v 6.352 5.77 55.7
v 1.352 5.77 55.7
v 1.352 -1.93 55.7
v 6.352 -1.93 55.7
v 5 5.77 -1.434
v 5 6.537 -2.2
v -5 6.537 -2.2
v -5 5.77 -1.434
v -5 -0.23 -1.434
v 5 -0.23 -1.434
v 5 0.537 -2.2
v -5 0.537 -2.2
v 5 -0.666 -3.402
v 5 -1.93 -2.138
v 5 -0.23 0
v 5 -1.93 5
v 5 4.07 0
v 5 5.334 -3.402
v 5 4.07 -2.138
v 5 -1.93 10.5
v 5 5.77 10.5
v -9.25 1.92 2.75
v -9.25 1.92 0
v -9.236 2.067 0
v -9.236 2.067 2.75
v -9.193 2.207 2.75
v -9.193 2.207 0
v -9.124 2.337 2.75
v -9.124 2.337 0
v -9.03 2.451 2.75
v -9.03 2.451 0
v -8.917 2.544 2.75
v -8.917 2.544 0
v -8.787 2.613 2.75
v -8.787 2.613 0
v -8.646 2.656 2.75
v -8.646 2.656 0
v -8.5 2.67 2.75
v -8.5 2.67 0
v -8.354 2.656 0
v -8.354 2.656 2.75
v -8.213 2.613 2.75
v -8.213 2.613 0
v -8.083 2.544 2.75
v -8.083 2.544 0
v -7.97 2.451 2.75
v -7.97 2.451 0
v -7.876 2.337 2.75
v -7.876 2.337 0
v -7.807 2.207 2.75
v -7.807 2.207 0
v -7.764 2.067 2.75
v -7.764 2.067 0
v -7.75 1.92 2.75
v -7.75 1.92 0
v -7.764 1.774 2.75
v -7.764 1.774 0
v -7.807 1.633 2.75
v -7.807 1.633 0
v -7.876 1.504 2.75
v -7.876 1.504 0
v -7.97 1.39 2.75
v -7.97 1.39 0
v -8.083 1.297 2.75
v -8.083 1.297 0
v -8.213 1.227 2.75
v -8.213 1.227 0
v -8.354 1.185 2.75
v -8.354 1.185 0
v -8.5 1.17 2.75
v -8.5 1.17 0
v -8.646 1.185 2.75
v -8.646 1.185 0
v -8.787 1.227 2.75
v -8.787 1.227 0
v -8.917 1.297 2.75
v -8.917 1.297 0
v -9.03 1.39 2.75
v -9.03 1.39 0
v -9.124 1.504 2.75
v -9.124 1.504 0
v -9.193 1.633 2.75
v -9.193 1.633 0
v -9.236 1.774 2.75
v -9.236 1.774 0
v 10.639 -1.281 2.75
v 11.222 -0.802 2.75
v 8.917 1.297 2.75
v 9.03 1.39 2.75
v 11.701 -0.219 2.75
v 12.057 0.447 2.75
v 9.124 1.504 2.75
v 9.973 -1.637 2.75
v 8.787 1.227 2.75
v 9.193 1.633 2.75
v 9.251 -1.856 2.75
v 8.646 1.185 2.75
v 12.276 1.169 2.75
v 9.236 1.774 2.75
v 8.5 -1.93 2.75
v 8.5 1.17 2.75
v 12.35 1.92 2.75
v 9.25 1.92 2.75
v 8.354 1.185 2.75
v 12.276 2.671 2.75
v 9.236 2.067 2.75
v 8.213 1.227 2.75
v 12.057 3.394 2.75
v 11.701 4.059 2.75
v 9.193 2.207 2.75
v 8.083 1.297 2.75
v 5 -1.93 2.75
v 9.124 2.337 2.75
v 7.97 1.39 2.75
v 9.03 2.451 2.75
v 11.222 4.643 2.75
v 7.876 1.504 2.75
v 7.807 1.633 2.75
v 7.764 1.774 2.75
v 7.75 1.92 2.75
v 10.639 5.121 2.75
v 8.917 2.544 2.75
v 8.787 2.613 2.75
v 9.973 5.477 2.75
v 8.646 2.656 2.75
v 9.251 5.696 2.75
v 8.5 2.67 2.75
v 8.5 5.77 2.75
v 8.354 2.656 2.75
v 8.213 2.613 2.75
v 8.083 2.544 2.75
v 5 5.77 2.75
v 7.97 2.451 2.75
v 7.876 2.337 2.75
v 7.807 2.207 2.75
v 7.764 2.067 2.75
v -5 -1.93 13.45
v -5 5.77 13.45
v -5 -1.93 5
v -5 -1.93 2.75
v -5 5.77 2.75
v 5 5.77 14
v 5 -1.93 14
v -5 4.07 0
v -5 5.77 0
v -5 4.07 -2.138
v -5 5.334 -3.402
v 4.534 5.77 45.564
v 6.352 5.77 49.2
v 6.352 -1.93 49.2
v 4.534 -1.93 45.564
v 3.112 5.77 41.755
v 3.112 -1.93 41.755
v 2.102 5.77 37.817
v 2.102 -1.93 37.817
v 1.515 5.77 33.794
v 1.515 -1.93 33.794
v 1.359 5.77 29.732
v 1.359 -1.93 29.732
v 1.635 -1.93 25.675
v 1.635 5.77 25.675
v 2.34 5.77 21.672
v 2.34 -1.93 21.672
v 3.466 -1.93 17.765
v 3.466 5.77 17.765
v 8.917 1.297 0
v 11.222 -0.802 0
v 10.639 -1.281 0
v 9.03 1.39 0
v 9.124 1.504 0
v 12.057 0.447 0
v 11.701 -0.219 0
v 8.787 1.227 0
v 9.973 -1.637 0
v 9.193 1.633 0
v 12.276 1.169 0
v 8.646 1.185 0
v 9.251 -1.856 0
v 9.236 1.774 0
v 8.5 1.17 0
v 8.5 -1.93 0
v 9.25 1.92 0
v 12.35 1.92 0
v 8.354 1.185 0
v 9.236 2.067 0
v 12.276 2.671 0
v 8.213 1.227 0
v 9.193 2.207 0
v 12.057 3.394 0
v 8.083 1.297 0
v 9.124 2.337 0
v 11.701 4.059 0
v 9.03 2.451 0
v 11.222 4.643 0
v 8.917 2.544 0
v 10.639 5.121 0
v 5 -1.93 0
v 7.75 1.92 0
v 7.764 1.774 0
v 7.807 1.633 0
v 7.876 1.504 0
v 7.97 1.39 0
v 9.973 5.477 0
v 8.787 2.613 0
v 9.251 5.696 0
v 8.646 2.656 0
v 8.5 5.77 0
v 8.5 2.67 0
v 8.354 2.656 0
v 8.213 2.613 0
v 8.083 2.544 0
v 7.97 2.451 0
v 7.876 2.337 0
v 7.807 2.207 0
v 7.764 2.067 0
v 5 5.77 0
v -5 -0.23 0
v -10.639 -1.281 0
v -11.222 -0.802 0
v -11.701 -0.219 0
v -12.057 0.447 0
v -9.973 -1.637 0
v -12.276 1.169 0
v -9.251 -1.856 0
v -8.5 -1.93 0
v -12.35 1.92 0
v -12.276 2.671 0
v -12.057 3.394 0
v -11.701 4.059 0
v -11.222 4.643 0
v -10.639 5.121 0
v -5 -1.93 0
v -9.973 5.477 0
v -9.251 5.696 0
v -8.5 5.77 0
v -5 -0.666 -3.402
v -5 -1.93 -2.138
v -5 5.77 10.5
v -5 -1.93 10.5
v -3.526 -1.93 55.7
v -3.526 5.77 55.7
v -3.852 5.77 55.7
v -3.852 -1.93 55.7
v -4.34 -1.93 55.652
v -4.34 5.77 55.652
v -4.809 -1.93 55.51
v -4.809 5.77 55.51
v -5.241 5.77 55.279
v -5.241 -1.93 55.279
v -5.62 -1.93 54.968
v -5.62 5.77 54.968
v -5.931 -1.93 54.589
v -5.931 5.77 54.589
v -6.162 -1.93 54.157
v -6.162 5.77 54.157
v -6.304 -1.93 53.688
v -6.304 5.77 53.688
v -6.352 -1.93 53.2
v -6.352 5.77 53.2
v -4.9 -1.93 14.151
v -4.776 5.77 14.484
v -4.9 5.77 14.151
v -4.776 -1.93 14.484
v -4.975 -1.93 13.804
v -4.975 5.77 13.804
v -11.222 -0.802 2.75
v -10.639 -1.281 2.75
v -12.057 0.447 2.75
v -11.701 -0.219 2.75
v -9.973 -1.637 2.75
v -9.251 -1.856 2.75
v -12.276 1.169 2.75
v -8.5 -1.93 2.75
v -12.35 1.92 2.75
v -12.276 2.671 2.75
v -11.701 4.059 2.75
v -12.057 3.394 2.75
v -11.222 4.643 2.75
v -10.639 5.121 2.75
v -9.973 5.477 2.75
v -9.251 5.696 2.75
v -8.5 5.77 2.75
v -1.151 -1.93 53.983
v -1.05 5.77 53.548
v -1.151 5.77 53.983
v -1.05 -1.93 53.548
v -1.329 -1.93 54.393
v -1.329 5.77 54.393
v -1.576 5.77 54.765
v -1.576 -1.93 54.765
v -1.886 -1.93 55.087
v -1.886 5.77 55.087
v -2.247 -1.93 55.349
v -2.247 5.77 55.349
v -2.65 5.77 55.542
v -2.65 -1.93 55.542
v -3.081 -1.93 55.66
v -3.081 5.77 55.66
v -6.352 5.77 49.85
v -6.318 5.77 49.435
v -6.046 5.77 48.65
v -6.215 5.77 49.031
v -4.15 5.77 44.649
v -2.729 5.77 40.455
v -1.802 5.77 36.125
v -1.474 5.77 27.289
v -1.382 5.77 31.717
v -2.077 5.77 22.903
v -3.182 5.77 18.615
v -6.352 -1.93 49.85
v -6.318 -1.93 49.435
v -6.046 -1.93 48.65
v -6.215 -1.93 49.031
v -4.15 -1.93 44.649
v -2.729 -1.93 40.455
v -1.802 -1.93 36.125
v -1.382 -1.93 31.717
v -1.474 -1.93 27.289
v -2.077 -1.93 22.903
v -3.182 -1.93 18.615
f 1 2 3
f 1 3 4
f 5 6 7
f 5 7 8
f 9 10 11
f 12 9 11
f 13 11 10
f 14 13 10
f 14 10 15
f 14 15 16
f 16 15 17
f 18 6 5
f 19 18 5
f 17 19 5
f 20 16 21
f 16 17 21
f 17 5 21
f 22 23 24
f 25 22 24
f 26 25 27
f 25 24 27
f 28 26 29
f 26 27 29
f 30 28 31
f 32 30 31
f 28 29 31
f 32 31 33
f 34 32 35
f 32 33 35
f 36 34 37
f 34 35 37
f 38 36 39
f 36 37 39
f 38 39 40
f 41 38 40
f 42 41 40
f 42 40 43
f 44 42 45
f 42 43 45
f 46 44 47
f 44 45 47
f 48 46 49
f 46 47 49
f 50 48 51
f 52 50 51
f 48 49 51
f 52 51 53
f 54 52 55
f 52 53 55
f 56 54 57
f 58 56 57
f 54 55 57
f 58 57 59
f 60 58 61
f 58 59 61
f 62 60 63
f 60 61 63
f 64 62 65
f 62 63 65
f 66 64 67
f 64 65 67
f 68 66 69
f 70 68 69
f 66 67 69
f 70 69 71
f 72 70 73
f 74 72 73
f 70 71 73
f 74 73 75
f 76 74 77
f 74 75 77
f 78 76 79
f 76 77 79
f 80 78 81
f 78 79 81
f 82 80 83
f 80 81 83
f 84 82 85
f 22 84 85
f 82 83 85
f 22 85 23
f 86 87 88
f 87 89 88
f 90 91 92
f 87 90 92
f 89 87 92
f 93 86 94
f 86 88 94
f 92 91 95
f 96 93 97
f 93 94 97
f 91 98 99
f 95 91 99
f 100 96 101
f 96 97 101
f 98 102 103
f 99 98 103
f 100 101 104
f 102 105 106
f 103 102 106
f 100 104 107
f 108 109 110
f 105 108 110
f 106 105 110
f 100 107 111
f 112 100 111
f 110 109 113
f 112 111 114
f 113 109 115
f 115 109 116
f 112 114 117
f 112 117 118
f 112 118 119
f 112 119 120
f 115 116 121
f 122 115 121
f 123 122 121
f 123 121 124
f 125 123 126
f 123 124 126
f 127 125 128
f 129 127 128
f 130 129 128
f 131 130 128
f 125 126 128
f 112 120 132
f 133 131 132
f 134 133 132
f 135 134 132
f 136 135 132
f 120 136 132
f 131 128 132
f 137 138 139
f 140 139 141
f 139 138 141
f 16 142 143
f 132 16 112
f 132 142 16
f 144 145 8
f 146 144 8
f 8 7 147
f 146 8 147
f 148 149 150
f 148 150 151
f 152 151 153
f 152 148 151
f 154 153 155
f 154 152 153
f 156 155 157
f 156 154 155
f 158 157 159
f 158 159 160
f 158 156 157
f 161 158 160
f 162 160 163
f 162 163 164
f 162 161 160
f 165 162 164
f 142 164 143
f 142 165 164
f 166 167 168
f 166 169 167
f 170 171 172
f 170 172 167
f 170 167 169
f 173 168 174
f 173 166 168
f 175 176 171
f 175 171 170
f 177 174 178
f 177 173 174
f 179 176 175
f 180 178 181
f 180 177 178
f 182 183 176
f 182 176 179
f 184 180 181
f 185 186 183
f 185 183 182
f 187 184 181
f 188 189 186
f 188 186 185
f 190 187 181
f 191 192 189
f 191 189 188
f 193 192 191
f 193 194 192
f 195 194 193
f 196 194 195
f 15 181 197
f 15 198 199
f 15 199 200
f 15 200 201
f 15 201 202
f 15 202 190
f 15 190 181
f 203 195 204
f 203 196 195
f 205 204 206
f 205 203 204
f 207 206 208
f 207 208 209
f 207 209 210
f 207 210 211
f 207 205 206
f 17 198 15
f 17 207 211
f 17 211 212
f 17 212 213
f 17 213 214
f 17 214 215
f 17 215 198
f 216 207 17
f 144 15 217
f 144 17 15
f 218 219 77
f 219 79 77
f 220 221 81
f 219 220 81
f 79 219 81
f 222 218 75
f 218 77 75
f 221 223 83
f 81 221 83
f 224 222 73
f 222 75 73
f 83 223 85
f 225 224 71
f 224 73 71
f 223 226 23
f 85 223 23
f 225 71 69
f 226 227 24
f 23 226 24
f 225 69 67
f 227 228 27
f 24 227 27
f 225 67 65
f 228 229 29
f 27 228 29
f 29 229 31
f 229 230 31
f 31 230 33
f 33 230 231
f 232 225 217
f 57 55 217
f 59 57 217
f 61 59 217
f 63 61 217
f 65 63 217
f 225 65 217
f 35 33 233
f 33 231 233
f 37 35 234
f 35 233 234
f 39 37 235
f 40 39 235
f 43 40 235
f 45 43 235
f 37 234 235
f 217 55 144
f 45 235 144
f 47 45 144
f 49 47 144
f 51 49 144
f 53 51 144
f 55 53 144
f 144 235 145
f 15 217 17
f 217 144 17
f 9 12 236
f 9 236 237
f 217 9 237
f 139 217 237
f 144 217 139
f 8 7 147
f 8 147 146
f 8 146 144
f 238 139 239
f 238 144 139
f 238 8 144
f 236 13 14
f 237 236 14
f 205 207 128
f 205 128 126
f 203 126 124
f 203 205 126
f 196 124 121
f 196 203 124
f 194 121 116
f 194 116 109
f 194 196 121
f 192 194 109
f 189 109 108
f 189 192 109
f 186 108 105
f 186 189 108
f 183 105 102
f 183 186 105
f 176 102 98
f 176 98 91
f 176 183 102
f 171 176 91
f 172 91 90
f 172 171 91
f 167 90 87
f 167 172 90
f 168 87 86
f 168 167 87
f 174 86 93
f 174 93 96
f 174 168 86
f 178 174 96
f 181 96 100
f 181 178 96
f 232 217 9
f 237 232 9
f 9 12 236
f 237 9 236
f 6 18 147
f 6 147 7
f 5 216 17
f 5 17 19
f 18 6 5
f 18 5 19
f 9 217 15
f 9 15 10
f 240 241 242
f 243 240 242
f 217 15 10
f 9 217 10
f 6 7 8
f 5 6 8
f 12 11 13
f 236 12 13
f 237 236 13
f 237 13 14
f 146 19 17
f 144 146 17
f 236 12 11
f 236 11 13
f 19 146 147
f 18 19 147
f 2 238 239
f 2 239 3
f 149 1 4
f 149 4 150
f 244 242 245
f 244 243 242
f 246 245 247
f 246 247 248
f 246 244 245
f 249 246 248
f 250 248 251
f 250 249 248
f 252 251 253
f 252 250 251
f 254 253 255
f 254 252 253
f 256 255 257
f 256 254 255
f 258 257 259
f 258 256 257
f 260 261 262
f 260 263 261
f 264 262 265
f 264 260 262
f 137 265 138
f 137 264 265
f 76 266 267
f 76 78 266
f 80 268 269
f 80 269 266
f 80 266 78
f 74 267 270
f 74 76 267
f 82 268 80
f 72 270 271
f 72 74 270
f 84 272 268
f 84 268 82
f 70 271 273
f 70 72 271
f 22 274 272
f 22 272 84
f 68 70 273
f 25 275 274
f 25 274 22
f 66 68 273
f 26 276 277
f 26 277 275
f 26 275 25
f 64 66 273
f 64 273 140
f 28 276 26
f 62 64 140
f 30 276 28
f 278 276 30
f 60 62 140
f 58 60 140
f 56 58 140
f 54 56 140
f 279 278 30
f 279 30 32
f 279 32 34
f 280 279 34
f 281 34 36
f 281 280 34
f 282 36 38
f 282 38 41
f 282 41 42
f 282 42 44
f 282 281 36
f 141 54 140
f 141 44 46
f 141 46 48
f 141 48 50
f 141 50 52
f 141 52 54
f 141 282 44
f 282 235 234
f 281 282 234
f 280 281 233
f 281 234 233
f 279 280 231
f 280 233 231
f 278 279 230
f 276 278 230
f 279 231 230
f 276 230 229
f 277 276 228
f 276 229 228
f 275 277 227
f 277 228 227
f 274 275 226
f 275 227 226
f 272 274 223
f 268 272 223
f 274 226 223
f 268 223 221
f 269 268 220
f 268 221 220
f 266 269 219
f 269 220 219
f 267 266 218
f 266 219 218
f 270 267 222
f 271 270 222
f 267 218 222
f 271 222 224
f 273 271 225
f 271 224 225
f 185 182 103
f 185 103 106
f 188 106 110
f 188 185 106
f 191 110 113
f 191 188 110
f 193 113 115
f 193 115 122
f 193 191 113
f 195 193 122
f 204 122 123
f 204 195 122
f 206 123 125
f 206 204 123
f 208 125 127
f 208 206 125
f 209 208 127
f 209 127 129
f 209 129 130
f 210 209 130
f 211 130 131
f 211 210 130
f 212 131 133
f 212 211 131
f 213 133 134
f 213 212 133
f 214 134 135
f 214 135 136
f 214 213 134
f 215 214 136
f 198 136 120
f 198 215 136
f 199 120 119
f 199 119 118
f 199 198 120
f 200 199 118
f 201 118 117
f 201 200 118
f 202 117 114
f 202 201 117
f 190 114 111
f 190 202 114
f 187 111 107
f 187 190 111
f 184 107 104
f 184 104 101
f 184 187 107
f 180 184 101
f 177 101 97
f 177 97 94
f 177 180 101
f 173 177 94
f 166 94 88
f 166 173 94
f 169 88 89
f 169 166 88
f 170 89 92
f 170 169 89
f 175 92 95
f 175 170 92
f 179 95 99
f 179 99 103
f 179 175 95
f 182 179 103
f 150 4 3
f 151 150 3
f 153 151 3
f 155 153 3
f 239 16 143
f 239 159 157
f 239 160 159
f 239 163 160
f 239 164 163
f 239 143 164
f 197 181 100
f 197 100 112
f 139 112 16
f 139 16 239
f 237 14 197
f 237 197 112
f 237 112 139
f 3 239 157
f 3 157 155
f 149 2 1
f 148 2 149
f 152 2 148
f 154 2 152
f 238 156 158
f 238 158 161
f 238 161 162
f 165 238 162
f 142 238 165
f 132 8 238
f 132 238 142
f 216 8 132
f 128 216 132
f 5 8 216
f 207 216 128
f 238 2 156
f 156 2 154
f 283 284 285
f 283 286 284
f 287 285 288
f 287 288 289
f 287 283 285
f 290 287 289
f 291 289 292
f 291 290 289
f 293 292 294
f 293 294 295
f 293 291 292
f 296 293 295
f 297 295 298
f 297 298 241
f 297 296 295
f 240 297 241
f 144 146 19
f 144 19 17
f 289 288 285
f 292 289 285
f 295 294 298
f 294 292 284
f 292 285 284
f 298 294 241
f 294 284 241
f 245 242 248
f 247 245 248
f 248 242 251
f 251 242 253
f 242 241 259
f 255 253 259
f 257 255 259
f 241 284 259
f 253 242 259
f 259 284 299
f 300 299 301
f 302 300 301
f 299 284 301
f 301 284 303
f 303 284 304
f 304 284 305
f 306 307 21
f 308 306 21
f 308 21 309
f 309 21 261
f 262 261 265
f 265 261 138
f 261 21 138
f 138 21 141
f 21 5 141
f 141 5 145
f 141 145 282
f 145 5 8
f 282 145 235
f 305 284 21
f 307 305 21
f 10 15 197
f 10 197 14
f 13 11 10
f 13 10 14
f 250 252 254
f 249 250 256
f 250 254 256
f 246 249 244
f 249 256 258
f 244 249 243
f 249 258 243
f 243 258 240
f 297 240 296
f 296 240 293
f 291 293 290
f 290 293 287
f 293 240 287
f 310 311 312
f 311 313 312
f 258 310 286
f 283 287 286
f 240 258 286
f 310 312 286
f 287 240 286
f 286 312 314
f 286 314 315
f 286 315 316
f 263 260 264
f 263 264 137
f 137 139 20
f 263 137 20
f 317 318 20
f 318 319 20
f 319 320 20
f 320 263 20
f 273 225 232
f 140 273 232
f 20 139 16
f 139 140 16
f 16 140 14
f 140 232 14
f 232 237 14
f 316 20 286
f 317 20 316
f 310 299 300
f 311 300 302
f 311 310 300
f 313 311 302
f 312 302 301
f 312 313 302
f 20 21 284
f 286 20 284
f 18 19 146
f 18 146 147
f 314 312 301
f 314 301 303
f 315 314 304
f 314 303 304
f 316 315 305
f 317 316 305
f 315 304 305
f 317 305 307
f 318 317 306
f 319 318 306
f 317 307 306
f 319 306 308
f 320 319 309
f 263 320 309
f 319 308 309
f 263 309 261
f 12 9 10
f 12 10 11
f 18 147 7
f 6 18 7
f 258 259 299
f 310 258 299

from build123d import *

# Parameters (mm, degrees)
SKETCH2_W           = 10
SKETCH2_H           = 14.768412439
BOSS_EXTRUDE1_DEPTH = 5
BOSS_EXTRUDE4_DEPTH = 10
SKETCH9_W           = 10
SKETCH9_H           = 3.18
SKETCH9_H_2         = 3.888412439
CUT_EXTRUDE3_DEPTH  = 5
BOSS_EXTRUDE5_DEPTH = 7.7
SKETCH12_R          = 0.75
BOSS_EXTRUDE7_DEPTH = 2.75
FILLET1_R           = 2.5


with BuildPart() as part:
    # Sketch2 → Boss-Extrude1 (new body)
    with BuildSketch(Plane.XY):
        with Locations((0, 1.566049366)):
            Rectangle(SKETCH2_W, SKETCH2_H)
    extrude(amount=BOSS_EXTRUDE1_DEPTH)

    # Sketch8 → Boss-Extrude4 (add)
    with BuildSketch(Plane.ZY.offset(5)):
        Polygon((-0.15, 5.770255585), (0, 5.770255585), (0, 4.070255585), (-0.15, 4.070255585), (-2.137867966, 4.070255585), (-3.402081528, 5.334469147), (-2.2, 6.536550675), (-1.43370491, 5.770255585), align=None)
        Polygon((-0.15, -1.929744415), (0, -1.929744415), (0, -0.229744415), (-0.15, -0.229744415), (-1.43370491, -0.229744415), (-2.2, 0.536550675), (-3.402081528, -0.665530853), (-2.137867966, -1.929744415), align=None)
    extrude(amount=-BOSS_EXTRUDE4_DEPTH)

    # Sketch9 → Cut-Extrude3 (cut)
    with BuildSketch(Plane(origin=(0, 0, 0), x_dir=(-1, 0, 0), z_dir=(0, 0, -1))):
        with Locations((0, 7.360255585)):
            Rectangle(SKETCH9_W, SKETCH9_H)
        with Locations((0, -3.873950635)):
            Rectangle(SKETCH9_W, SKETCH9_H_2)
    extrude(amount=-CUT_EXTRUDE3_DEPTH, mode=Mode.SUBTRACT)

    # Sketch10 → Boss-Extrude5 (add)
    with BuildSketch(Plane(origin=(0, 5.770255585, 0), x_dir=(1, 0, 0), z_dir=(0, 1, 0))):
        with BuildLine():
            Line((-5, -5), (-5, -10.5))
            Line((-5, -10.5), (1.352445729, -55.7))
            Line((1.352445729, -55.7), (6.352445729, -55.7))
            Line((6.352445729, -55.7), (6.352445729, -49.2))
            ThreePointArc((6.352445729, -49.2), (1.383429579, -31.764936646), (5, -14))
            Line((5, -14), (5, -5))
            Line((5, -5), (-5, -5))
        make_face()
    extrude(amount=-BOSS_EXTRUDE5_DEPTH)

    # Sketch12 → Boss-Extrude7 (add)
    with BuildSketch(Plane.XY):
        with BuildLine():
            Line((5, 5.770255585), (8.5, 5.770255585))
            ThreePointArc((8.5, 5.770255585), (12.35, 1.920255585), (8.5, -1.929744415))
            Line((8.5, -1.929744415), (5, -1.929744415))
            Line((5, -1.929744415), (5, 5.770255585))
        make_face()
        with Locations((8.5, 1.920255585)):
            Circle(SKETCH12_R, mode=Mode.SUBTRACT)
    extrude(amount=BOSS_EXTRUDE7_DEPTH)


with BuildPart() as body_2:
    # Mirror1: mirrored copy
    add(part.part.mirror(Plane(origin=(0, 0, 0), x_dir=(0, 0, 1), z_dir=(1, 0, 0))))

    # Fillet1
    fillet1_edges = [body_2.edges().sort_by_distance(p)[0] for p in [
        (-6.352445729, 1.920255585, 49.2),
        (-5, 1.920255585, 14),
        (-1.352445729, 1.920255585, 55.7),
        (-6.352445729, 1.920255585, 55.7),
    ]]
    fillet(fillet1_edges, radius=FILLET1_R)


solid = Compound([part.part, body_2.part])
